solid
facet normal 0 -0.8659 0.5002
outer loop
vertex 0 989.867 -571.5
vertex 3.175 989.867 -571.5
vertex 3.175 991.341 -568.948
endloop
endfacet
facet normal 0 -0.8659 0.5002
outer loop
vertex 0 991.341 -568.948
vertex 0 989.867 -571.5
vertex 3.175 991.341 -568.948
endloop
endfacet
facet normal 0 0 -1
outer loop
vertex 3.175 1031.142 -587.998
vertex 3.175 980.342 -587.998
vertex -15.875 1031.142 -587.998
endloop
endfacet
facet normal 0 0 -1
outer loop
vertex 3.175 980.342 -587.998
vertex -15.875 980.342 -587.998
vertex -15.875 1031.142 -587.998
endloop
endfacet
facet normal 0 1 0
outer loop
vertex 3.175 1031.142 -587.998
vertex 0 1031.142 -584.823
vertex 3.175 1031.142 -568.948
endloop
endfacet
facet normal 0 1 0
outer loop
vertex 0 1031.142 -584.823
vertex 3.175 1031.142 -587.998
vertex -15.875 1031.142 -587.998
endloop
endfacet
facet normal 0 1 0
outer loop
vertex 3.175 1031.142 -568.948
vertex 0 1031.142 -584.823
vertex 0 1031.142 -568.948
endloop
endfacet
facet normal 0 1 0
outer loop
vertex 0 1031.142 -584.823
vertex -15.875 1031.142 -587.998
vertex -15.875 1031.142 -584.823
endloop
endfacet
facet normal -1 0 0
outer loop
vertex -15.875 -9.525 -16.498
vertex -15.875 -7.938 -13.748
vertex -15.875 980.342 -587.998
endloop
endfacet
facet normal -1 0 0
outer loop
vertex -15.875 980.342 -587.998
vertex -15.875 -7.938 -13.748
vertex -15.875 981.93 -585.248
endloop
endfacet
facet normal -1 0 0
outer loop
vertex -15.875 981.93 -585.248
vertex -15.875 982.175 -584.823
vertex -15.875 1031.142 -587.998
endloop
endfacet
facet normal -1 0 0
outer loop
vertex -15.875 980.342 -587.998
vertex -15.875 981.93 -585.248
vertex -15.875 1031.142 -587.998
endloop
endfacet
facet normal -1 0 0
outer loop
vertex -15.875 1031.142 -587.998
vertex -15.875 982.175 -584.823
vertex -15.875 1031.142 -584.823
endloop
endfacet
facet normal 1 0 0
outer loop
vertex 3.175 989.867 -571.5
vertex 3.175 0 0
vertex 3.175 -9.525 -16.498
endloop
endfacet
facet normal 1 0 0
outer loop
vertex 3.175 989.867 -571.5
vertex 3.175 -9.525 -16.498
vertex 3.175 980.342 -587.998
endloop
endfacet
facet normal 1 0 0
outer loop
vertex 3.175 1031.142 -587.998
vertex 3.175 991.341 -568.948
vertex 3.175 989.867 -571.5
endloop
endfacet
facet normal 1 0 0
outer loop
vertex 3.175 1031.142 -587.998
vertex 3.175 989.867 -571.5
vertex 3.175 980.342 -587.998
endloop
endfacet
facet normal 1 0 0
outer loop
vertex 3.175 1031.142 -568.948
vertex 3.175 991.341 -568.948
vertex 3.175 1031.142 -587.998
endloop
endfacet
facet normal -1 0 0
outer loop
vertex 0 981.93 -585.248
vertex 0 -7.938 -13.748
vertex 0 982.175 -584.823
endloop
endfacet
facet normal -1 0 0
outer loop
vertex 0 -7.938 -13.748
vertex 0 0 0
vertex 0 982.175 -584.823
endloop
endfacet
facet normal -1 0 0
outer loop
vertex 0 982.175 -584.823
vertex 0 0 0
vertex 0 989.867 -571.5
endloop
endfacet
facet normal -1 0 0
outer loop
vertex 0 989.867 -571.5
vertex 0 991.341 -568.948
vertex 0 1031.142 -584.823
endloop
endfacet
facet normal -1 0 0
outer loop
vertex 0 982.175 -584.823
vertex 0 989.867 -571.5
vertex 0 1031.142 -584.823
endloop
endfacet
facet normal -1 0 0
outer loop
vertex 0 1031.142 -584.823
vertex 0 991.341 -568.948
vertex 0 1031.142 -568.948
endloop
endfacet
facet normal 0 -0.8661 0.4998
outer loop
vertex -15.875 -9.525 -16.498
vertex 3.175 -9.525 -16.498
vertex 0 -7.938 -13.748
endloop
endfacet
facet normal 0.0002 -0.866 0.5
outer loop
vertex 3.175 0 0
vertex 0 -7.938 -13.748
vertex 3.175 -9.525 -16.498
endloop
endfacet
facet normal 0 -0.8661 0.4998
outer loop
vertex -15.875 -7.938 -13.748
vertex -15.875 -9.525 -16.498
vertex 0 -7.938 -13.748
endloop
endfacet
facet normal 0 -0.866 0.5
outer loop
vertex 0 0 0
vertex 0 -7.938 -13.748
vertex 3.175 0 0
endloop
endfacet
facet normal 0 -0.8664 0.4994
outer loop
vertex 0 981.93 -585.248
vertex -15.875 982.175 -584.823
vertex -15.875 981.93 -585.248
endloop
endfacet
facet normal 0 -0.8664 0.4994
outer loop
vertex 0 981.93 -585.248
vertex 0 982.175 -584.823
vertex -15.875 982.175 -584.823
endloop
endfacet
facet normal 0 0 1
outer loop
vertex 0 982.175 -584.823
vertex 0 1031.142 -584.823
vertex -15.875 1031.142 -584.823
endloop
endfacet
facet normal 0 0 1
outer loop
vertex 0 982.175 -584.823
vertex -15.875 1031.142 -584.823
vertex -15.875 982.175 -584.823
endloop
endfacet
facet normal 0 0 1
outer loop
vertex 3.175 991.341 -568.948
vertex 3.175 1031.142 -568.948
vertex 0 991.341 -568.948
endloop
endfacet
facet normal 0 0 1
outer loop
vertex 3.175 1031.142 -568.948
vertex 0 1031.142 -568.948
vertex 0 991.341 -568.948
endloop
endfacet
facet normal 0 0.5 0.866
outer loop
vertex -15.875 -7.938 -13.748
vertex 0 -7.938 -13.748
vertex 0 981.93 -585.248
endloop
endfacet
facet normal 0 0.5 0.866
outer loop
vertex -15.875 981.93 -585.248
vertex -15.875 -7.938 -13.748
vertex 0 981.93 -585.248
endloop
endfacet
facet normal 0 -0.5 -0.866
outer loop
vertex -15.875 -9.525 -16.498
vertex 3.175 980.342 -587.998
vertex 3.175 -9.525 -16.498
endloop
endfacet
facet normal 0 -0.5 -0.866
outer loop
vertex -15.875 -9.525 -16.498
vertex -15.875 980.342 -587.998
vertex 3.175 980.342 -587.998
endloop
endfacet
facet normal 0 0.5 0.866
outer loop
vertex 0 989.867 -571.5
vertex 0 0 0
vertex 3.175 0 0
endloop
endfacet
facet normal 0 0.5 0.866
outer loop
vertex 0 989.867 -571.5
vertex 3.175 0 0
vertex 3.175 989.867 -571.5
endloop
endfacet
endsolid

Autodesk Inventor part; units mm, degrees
ref_plane "YZ Plane" through (0, 0, 0) normal (1, 0, 0) x (0, 1, 0)
ref_plane "XZ Plane" through (0, 0, 0) normal (0, 1, 0) x (-1, 0, 0)
ref_plane "XY Plane" through (0, 0, 0) normal (0, 0, 1) x (1, 0, 0)
sketch "Sketch1" plane through (0, 0, 0) normal (1, 0, 0) x (0, 1, 0)
  line L0 (0, 0) -> (989.867, -571.5)
  line L1 (989.867, -571.5) -> (980.342, -587.9978)
  line L2 (980.342, -587.9978) -> (-9.525, -16.4978)
  line L3 (-9.525, -16.4978) -> (0, 0)
  line L4 (0, 0) -> (51.1145, 0)
  line L5 (980.342, -587.9978) -> (1031.142, -587.9978)
  line L6 (1031.142, -587.9978) -> (1031.142, -568.9478)
  line L7 (989.867, -571.5) -> (991.3406, -568.9478)
  line L8 (1031.142, -568.9478) -> (991.3406, -568.9478)
  line L9 (-9.525, -16.4978) -> (-7.9375, -13.7482)
  line L10 (-7.9375, -13.7482) -> (981.9295, -585.2482)
  line L11 (1031.142, -587.9978) -> (1031.142, -584.8228)
  line L12 (1031.142, -584.8228) -> (982.1751, -584.8228)
  dimension "d0" = 1143
  dimension "d1" = 19.05
  dimension "d2" = 1143
  dimension "d3" = 30
  dimension "d4" = 50.8
  dimension "d5" = 19.05
  dimension "d6" = 3.175
  dimension "d7" = 1143
  dimension "d8" = 3.175
extrude "Extrusion1" add sketch "Sketch1" along normal blind 3.175
extrude "Extrusion2" add sketch "Sketch1" against normal blind 15.875 contours L10 L1 L2 L3 | L12 L6 L5 L1
properties part number "DiagL2"
